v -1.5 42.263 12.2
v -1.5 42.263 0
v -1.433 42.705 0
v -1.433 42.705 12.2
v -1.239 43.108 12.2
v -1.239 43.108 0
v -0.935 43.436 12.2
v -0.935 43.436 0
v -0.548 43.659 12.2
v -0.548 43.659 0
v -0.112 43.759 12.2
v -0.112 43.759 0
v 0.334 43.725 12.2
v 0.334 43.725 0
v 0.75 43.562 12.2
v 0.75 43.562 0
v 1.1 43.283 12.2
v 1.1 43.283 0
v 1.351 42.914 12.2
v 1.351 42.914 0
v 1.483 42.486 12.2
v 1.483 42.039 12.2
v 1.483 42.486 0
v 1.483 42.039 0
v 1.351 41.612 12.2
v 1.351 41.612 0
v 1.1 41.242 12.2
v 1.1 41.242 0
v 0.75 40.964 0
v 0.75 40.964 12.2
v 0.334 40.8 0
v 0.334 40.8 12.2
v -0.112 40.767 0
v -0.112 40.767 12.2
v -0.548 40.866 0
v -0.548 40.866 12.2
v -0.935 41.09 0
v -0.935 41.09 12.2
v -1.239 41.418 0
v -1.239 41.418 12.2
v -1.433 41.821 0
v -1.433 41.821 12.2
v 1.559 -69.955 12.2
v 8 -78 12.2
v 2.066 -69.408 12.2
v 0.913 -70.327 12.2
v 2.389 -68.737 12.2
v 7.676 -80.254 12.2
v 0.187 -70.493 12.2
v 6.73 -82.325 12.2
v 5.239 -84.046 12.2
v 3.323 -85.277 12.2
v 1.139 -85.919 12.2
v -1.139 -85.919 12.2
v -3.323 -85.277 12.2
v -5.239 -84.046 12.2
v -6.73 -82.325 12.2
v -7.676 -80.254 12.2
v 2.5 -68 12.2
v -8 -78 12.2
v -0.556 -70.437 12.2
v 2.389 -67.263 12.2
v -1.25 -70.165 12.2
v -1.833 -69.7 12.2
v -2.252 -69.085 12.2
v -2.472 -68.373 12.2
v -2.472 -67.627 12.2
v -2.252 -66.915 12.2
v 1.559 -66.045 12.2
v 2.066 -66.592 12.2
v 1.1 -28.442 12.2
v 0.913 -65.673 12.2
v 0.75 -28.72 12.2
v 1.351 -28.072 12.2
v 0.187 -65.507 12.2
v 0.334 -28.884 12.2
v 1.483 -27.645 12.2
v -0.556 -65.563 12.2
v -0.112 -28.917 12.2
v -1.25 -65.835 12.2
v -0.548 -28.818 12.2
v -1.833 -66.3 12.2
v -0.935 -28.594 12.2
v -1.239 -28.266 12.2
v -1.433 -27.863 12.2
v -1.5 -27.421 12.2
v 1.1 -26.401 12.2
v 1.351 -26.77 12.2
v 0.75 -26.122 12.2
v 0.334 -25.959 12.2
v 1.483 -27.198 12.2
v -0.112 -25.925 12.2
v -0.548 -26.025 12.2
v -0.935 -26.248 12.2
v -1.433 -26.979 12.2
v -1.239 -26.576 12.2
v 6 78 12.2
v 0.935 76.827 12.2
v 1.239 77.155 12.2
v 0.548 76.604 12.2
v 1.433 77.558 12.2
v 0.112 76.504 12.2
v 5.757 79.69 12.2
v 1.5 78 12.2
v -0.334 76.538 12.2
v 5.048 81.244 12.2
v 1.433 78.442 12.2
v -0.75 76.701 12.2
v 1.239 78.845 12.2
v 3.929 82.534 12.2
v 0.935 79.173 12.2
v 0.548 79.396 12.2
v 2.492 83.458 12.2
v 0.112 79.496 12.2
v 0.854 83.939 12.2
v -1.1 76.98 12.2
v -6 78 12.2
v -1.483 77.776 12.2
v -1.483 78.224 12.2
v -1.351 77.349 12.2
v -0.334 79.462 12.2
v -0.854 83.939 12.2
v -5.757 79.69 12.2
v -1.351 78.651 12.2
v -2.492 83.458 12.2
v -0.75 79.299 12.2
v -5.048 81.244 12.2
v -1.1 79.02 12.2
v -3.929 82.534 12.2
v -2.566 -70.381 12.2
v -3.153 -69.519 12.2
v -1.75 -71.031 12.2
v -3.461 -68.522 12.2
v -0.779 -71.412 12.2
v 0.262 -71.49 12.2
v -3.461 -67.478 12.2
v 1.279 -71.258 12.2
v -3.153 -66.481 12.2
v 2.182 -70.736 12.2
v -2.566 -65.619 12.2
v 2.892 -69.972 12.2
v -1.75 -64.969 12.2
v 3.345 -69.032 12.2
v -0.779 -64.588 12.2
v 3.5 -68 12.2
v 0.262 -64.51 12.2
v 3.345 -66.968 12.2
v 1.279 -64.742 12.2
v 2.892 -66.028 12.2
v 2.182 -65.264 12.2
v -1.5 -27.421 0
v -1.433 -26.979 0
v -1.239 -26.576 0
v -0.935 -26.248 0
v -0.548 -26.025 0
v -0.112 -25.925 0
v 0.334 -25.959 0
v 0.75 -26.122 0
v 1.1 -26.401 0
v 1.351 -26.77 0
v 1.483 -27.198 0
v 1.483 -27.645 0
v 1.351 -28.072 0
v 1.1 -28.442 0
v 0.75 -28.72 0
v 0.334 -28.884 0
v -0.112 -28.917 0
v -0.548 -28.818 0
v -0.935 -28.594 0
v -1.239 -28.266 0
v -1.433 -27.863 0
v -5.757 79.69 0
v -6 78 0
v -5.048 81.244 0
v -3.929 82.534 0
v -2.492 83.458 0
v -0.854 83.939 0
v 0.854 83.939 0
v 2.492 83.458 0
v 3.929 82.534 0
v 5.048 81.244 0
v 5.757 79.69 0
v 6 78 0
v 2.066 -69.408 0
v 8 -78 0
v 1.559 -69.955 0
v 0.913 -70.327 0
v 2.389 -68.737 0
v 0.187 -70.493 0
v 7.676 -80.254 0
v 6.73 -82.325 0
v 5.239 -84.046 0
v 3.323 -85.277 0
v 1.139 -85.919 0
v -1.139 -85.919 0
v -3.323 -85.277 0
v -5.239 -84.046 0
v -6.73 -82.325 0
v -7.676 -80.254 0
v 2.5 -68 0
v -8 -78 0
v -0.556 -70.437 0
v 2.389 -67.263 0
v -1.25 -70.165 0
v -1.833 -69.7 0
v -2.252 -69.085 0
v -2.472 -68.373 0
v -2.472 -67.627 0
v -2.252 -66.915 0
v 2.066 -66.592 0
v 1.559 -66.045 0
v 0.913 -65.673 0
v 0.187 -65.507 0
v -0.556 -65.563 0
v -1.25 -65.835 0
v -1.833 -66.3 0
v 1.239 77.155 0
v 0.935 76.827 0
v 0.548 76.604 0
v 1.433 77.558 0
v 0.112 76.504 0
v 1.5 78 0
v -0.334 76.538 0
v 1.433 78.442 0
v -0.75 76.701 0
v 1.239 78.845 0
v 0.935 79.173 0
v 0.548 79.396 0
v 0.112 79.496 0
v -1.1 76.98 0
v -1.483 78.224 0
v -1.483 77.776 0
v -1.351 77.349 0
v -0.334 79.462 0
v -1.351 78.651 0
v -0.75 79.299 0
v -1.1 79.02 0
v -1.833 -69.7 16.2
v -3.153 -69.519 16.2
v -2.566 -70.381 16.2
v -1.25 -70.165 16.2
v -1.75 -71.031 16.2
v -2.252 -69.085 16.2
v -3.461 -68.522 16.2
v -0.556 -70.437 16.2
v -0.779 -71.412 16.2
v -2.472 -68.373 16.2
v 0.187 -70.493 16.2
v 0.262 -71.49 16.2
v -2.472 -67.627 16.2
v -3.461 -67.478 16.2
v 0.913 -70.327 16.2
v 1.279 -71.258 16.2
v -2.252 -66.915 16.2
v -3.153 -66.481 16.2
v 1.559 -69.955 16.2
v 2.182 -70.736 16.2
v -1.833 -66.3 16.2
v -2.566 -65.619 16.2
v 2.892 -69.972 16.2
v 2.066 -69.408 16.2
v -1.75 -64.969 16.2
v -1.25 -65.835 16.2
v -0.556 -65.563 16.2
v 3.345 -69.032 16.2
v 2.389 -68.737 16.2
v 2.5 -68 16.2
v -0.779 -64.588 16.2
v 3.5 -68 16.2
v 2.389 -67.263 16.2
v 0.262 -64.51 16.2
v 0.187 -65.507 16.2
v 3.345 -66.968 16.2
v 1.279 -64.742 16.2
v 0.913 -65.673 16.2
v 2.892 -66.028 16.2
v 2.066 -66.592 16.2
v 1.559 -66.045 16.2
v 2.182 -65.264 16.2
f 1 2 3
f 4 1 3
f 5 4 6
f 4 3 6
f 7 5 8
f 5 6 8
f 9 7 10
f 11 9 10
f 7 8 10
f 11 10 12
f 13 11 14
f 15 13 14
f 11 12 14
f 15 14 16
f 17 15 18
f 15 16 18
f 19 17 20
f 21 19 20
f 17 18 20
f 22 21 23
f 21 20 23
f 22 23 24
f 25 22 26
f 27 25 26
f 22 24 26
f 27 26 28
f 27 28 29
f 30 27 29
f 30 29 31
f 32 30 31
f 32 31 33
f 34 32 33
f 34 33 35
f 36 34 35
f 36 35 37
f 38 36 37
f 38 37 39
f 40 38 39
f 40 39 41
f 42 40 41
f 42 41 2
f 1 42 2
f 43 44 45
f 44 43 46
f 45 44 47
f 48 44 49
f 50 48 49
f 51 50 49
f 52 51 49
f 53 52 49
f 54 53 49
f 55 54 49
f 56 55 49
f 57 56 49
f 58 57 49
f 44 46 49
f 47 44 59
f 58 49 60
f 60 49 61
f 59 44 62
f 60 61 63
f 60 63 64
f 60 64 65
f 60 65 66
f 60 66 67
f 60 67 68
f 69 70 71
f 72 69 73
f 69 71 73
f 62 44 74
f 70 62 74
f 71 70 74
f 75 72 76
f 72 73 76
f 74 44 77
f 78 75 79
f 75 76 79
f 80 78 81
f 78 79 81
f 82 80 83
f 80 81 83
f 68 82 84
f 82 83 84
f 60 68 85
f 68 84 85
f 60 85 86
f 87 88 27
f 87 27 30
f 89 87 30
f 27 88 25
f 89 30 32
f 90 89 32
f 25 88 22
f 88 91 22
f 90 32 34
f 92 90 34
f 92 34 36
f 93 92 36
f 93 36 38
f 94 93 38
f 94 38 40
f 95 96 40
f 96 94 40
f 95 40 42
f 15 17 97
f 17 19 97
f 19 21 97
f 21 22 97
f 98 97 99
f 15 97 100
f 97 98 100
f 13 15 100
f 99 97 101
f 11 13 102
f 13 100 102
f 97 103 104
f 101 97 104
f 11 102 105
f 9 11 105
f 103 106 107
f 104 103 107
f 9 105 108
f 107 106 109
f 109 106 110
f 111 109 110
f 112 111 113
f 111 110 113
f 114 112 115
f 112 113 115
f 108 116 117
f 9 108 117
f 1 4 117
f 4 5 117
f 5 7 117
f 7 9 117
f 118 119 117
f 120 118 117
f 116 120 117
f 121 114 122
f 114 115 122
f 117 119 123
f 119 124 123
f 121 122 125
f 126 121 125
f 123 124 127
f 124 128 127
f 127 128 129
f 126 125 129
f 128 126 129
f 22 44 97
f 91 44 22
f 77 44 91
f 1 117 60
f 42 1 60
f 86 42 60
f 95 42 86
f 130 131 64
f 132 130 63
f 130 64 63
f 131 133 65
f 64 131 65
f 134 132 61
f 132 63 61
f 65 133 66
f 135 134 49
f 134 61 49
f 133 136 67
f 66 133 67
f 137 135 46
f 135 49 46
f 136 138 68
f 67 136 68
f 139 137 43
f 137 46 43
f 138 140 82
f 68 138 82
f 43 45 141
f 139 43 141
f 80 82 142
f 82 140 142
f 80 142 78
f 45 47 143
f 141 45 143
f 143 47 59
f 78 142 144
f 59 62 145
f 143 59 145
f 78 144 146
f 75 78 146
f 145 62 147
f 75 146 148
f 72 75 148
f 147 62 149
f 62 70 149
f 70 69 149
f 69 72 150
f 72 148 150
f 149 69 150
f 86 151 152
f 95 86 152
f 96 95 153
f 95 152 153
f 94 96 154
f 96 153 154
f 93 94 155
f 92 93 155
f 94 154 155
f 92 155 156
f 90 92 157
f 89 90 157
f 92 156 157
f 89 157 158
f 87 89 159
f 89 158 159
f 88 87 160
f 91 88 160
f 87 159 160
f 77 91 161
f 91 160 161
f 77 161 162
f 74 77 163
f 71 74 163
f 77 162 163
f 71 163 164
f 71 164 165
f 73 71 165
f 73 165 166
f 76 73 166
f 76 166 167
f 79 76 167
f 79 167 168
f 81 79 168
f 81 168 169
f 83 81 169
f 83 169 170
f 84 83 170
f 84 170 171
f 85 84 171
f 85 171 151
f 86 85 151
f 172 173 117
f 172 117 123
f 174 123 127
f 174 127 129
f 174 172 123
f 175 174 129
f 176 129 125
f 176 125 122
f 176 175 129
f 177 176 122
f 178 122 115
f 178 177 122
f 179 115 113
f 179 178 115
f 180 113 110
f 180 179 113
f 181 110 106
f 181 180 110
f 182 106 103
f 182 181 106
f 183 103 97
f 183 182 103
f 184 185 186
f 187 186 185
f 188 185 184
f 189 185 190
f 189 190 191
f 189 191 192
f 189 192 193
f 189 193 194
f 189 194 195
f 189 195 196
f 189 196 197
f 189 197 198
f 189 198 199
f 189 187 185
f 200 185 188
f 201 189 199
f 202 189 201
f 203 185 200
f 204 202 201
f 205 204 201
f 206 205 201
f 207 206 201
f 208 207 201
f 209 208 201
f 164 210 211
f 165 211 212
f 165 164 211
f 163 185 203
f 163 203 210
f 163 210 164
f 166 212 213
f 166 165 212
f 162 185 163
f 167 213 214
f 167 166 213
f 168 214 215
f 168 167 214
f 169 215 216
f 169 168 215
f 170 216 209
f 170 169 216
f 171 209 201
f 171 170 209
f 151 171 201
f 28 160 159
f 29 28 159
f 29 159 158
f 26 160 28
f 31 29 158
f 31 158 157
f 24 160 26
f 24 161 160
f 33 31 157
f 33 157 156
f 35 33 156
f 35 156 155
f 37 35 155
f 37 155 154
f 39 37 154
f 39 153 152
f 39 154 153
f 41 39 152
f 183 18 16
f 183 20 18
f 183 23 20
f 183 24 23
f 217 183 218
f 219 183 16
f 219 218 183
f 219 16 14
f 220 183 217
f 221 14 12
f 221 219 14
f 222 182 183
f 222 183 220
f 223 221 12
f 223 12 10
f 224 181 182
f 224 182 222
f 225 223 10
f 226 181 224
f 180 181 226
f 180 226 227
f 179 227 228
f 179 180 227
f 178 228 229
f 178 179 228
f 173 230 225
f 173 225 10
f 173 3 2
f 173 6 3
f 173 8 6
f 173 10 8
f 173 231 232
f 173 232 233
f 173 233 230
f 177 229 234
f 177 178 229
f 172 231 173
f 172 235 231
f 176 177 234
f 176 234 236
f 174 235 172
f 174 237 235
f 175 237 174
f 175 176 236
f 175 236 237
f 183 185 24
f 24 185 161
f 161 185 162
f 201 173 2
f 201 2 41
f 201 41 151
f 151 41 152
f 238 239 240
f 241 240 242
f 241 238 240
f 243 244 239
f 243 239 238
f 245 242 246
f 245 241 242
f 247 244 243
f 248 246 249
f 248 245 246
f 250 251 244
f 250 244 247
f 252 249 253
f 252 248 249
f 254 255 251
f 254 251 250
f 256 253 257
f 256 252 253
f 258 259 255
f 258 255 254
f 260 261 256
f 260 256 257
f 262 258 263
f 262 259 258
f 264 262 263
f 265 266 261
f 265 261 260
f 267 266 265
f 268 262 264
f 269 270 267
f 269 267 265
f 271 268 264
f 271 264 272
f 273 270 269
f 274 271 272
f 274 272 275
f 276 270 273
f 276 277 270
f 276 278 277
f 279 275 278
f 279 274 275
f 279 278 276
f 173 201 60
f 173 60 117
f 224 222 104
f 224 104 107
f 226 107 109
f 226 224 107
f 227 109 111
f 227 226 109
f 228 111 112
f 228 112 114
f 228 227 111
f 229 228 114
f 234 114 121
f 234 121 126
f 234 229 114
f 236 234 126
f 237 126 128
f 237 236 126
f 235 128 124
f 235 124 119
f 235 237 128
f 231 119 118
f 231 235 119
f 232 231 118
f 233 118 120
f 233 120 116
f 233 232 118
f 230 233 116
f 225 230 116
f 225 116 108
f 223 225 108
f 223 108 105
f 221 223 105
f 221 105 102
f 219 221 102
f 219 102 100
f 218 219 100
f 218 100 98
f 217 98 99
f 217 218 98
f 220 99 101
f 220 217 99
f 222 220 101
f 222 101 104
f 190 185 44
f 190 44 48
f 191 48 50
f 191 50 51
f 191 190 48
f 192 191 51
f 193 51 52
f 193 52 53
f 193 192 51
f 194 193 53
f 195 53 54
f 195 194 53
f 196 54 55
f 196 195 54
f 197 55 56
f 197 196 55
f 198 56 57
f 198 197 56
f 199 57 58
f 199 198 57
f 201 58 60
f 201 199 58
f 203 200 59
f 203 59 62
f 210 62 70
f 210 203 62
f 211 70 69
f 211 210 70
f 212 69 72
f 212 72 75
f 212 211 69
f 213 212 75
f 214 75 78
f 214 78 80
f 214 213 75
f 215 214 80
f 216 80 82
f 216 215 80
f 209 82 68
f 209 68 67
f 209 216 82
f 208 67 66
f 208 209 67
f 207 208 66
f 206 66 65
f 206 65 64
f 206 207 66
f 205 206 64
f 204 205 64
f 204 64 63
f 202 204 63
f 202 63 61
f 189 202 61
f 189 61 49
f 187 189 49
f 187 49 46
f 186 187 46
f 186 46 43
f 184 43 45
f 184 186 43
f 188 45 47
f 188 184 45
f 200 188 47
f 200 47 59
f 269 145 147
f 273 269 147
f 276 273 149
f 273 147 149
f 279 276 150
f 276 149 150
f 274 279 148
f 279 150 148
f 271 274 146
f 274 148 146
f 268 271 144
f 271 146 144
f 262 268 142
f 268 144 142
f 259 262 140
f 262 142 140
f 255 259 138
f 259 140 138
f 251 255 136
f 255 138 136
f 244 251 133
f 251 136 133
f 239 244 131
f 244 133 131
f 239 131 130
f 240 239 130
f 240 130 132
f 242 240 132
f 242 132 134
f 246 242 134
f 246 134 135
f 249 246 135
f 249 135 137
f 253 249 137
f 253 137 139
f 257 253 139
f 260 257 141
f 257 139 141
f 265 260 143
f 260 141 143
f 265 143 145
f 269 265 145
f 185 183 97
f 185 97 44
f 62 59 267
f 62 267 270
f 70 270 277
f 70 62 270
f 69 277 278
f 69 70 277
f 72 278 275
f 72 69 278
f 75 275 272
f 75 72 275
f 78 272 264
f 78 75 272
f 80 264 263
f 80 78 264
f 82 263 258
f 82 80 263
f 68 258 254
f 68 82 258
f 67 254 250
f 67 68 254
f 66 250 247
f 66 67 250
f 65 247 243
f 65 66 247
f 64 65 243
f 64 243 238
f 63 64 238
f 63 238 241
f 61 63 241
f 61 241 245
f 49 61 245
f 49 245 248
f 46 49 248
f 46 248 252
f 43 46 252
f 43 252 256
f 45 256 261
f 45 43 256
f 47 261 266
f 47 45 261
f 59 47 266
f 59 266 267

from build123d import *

# Parameters (mm, degrees)
SKETCH1_R           = 1.5
SKETCH1_R_2         = 2.5
BOSS_EXTRUDE2_DEPTH = 12.2
SKETCH3_R           = 3.5
SKETCH3_R_2         = 2.5
EXTRUDE_THIN1_DEPTH = 4
SKETCH4_R           = 1.5
CUT_EXTRUDE1_DEPTH  = 20


with BuildPart() as part:
    # Sketch1 → Boss-Extrude2 (new body)
    with BuildSketch(Plane.XY):
        with BuildLine():
            Line((6, 78), (8, -78))
            ThreePointArc((8, -78), (0, -86), (-8, -78))
            Line((-8, -78), (-6, 78))
            ThreePointArc((-6, 78), (0, 84), (6, 78))
        make_face()
        with Locations((0, 78)):
            Circle(SKETCH1_R, mode=Mode.SUBTRACT)
        with Locations((0, -68)):
            Circle(SKETCH1_R_2, mode=Mode.SUBTRACT)
    extrude(amount=BOSS_EXTRUDE2_DEPTH)

    # Sketch4 → Cut-Extrude1 (cut)
    with BuildSketch(Plane(origin=(0, 0, 0), x_dir=(-1, 0, 0), z_dir=(0, 0, -1))):
        with Locations((0, 42.26275725)):
            Circle(SKETCH4_R)
        with Locations((0, -27.421243353)):
            Circle(SKETCH4_R)
    extrude(amount=-CUT_EXTRUDE1_DEPTH, mode=Mode.SUBTRACT)


with BuildPart() as body_2:
    # Sketch3 → Extrude-Thin1 (new body)
    with BuildSketch(Plane.XY.offset(12.2)):
        with Locations((0, -68)):
            Circle(SKETCH3_R)
        with Locations((0, -68)):
            Circle(SKETCH3_R_2, mode=Mode.SUBTRACT)
    extrude(amount=EXTRUDE_THIN1_DEPTH)


solid = Compound([part.part, body_2.part])
